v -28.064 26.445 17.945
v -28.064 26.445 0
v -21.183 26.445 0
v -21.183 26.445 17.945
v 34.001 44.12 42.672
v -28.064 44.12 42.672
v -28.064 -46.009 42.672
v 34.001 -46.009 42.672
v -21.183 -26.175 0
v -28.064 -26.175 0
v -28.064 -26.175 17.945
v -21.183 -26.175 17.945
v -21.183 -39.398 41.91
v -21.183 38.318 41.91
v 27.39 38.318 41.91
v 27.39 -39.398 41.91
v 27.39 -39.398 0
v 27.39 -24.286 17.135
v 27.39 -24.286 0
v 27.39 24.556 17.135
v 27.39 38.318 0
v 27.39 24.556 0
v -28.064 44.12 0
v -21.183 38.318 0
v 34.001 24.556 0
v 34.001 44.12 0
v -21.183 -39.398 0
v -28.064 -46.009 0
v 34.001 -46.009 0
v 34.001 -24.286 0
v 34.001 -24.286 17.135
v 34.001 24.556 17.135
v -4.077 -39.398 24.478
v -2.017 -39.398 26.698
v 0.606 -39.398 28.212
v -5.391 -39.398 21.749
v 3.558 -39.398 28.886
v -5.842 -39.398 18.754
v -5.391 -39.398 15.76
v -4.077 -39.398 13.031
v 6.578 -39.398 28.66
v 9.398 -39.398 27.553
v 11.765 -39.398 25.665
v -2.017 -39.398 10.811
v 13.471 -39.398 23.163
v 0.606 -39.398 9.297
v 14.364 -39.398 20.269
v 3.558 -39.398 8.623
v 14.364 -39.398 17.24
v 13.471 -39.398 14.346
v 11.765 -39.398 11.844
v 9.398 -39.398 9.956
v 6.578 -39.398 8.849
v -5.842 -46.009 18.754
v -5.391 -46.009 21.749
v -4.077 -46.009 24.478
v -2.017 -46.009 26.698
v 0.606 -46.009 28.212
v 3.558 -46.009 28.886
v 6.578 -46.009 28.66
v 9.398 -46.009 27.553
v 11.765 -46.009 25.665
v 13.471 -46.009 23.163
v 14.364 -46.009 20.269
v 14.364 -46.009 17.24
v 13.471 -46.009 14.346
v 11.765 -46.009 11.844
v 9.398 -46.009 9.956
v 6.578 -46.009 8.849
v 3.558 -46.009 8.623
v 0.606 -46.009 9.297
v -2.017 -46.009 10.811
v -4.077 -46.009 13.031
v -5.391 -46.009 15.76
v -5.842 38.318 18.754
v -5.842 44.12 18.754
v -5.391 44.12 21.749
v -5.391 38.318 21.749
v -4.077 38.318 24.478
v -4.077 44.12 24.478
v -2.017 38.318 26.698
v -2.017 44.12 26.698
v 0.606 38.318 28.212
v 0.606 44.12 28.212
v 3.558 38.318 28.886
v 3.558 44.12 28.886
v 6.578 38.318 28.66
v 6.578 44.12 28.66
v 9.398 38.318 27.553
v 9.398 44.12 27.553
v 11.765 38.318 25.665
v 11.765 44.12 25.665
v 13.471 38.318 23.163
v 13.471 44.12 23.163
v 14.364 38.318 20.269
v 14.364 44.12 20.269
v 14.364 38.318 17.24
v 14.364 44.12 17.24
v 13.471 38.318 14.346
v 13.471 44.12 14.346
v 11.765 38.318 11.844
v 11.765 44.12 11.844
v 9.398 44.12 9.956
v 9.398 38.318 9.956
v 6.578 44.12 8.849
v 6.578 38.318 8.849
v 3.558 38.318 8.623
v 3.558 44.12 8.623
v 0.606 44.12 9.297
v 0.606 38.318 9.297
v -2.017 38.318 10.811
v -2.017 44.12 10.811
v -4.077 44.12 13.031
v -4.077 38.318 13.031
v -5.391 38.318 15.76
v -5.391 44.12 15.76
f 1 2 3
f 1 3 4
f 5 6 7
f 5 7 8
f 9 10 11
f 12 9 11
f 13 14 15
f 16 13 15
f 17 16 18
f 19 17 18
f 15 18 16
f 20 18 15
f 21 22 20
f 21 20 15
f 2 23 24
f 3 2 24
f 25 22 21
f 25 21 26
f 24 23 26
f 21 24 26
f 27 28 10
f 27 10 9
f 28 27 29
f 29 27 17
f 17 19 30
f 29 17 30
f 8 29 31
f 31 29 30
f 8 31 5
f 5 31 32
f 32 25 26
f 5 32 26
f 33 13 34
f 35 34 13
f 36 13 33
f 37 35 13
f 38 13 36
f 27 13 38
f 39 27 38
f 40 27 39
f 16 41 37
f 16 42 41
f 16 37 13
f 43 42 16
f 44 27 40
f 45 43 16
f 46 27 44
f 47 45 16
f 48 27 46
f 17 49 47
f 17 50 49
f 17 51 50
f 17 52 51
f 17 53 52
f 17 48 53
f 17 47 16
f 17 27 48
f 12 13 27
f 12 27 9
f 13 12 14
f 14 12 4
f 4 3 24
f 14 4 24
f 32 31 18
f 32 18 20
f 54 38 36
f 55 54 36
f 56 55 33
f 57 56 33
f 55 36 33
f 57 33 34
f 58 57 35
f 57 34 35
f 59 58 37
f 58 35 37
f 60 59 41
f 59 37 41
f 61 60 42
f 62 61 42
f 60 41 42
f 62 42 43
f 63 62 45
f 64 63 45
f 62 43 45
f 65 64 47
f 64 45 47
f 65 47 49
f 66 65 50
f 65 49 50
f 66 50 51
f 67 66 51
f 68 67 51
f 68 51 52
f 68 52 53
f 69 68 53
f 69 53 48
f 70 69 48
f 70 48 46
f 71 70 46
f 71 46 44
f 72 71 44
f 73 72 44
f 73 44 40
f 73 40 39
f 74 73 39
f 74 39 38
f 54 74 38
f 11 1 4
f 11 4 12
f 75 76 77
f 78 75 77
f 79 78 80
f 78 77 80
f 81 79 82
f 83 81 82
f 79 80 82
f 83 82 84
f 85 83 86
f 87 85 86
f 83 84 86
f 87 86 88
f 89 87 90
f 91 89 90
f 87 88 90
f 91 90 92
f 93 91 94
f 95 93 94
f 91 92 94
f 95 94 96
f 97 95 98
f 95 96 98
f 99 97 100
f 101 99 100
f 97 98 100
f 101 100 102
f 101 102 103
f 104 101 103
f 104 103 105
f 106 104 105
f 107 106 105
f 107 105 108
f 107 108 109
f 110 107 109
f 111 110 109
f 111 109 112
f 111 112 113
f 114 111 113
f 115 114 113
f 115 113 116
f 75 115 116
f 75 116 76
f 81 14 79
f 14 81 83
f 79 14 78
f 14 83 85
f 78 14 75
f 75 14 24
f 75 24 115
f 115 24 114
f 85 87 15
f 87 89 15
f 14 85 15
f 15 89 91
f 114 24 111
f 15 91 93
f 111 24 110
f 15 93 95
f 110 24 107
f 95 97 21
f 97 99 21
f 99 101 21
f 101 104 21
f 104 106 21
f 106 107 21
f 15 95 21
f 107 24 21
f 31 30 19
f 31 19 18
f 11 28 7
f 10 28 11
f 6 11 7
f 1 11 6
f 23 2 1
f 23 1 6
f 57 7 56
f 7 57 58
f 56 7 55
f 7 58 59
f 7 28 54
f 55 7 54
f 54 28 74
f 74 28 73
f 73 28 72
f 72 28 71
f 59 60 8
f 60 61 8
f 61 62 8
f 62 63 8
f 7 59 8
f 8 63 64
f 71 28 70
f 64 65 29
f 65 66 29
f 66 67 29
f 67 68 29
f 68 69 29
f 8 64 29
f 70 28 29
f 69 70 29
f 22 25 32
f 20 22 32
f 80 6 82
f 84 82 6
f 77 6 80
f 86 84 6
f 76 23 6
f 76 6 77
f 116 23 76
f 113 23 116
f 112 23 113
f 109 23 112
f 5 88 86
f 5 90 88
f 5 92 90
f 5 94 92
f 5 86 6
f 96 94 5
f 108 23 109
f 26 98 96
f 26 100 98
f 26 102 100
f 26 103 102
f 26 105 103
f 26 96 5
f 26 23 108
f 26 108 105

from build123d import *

# Parameters (mm, degrees)
F0_W      = 62.0650928468
F0_H      = 90.1293121278
F1_DEPTH  = 42.672
F2_W      = 48.5726818442
F2_H      = 77.7162946761
F3_DEPTH  = 76.454
F4_W      = 48.5726818442
F4_H      = 77.7162946761
F5_DEPTH  = 0.762
F7_D      = 20.32
F8_W      = 52.8902541846
F8_H      = 23.0720248073
F9_DEPTH  = 43.688
F10_W     = 52.6204034686
F10_H     = 17.9449077696
F12_DEPTH = 25.4
F13_W     = 48.8425306976
F13_H     = 17.1353630722
F14_DEPTH = 25.4


with BuildPart() as f1:
    # F0 (on Top) → F1 (new body)
    with BuildSketch(Plane.XY):
        with Locations((2.9683308676, -0.9444709867)):
            Rectangle(F0_W, F0_H)
    extrude(amount=F1_DEPTH)

    # F2 (on Top) → F3 (cut)
    with BuildSketch(Plane.XY):
        with Locations((3.1032543629, -0.5396958441)):
            Rectangle(F2_W, F2_H)
    extrude(amount=F3_DEPTH, mode=Mode.SUBTRACT)

    # F4 (on face) → F5 (join)
    with BuildSketch(Plane.XY.offset(42.672)):
        with Locations((3.1032543629, -0.5396958441)):
            Rectangle(F4_W, F4_H)
    extrude(amount=-F5_DEPTH)

    # F7 (through all)
    with Locations(Plane.XZ.offset(46.0091270506)):
        with Locations((4.317572806, 18.754452467)):
            Hole(F7_D / 2)

    # F8 (on face) → F9 (cut)
    with BuildSketch(Plane.YZ.offset(34.000877291)):
        with Locations((-2.4286350235, 11.5360124037)):
            Rectangle(F8_W, F8_H)
    extrude(amount=F9_DEPTH, mode=Mode.SUBTRACT)

    # F10 (on face) → F12 (cut)
    with BuildSketch(Plane(origin=(-28.0642155558, 0, 0), x_dir=(0, -1, 0), z_dir=(-1, 0, 0))):
        with Locations((-0.134922564, 8.9724538848)):
            Rectangle(F10_W, F10_H)
    extrude(amount=-F12_DEPTH, mode=Mode.SUBTRACT)

    # F13 (on face) → F14 (cut)
    with BuildSketch(Plane.YZ.offset(34.000877291)):
        with Locations((0.1349244267, 8.5676815361)):
            Rectangle(F13_W, F13_H)
    extrude(amount=-F14_DEPTH, mode=Mode.SUBTRACT)


solid = f1.part
